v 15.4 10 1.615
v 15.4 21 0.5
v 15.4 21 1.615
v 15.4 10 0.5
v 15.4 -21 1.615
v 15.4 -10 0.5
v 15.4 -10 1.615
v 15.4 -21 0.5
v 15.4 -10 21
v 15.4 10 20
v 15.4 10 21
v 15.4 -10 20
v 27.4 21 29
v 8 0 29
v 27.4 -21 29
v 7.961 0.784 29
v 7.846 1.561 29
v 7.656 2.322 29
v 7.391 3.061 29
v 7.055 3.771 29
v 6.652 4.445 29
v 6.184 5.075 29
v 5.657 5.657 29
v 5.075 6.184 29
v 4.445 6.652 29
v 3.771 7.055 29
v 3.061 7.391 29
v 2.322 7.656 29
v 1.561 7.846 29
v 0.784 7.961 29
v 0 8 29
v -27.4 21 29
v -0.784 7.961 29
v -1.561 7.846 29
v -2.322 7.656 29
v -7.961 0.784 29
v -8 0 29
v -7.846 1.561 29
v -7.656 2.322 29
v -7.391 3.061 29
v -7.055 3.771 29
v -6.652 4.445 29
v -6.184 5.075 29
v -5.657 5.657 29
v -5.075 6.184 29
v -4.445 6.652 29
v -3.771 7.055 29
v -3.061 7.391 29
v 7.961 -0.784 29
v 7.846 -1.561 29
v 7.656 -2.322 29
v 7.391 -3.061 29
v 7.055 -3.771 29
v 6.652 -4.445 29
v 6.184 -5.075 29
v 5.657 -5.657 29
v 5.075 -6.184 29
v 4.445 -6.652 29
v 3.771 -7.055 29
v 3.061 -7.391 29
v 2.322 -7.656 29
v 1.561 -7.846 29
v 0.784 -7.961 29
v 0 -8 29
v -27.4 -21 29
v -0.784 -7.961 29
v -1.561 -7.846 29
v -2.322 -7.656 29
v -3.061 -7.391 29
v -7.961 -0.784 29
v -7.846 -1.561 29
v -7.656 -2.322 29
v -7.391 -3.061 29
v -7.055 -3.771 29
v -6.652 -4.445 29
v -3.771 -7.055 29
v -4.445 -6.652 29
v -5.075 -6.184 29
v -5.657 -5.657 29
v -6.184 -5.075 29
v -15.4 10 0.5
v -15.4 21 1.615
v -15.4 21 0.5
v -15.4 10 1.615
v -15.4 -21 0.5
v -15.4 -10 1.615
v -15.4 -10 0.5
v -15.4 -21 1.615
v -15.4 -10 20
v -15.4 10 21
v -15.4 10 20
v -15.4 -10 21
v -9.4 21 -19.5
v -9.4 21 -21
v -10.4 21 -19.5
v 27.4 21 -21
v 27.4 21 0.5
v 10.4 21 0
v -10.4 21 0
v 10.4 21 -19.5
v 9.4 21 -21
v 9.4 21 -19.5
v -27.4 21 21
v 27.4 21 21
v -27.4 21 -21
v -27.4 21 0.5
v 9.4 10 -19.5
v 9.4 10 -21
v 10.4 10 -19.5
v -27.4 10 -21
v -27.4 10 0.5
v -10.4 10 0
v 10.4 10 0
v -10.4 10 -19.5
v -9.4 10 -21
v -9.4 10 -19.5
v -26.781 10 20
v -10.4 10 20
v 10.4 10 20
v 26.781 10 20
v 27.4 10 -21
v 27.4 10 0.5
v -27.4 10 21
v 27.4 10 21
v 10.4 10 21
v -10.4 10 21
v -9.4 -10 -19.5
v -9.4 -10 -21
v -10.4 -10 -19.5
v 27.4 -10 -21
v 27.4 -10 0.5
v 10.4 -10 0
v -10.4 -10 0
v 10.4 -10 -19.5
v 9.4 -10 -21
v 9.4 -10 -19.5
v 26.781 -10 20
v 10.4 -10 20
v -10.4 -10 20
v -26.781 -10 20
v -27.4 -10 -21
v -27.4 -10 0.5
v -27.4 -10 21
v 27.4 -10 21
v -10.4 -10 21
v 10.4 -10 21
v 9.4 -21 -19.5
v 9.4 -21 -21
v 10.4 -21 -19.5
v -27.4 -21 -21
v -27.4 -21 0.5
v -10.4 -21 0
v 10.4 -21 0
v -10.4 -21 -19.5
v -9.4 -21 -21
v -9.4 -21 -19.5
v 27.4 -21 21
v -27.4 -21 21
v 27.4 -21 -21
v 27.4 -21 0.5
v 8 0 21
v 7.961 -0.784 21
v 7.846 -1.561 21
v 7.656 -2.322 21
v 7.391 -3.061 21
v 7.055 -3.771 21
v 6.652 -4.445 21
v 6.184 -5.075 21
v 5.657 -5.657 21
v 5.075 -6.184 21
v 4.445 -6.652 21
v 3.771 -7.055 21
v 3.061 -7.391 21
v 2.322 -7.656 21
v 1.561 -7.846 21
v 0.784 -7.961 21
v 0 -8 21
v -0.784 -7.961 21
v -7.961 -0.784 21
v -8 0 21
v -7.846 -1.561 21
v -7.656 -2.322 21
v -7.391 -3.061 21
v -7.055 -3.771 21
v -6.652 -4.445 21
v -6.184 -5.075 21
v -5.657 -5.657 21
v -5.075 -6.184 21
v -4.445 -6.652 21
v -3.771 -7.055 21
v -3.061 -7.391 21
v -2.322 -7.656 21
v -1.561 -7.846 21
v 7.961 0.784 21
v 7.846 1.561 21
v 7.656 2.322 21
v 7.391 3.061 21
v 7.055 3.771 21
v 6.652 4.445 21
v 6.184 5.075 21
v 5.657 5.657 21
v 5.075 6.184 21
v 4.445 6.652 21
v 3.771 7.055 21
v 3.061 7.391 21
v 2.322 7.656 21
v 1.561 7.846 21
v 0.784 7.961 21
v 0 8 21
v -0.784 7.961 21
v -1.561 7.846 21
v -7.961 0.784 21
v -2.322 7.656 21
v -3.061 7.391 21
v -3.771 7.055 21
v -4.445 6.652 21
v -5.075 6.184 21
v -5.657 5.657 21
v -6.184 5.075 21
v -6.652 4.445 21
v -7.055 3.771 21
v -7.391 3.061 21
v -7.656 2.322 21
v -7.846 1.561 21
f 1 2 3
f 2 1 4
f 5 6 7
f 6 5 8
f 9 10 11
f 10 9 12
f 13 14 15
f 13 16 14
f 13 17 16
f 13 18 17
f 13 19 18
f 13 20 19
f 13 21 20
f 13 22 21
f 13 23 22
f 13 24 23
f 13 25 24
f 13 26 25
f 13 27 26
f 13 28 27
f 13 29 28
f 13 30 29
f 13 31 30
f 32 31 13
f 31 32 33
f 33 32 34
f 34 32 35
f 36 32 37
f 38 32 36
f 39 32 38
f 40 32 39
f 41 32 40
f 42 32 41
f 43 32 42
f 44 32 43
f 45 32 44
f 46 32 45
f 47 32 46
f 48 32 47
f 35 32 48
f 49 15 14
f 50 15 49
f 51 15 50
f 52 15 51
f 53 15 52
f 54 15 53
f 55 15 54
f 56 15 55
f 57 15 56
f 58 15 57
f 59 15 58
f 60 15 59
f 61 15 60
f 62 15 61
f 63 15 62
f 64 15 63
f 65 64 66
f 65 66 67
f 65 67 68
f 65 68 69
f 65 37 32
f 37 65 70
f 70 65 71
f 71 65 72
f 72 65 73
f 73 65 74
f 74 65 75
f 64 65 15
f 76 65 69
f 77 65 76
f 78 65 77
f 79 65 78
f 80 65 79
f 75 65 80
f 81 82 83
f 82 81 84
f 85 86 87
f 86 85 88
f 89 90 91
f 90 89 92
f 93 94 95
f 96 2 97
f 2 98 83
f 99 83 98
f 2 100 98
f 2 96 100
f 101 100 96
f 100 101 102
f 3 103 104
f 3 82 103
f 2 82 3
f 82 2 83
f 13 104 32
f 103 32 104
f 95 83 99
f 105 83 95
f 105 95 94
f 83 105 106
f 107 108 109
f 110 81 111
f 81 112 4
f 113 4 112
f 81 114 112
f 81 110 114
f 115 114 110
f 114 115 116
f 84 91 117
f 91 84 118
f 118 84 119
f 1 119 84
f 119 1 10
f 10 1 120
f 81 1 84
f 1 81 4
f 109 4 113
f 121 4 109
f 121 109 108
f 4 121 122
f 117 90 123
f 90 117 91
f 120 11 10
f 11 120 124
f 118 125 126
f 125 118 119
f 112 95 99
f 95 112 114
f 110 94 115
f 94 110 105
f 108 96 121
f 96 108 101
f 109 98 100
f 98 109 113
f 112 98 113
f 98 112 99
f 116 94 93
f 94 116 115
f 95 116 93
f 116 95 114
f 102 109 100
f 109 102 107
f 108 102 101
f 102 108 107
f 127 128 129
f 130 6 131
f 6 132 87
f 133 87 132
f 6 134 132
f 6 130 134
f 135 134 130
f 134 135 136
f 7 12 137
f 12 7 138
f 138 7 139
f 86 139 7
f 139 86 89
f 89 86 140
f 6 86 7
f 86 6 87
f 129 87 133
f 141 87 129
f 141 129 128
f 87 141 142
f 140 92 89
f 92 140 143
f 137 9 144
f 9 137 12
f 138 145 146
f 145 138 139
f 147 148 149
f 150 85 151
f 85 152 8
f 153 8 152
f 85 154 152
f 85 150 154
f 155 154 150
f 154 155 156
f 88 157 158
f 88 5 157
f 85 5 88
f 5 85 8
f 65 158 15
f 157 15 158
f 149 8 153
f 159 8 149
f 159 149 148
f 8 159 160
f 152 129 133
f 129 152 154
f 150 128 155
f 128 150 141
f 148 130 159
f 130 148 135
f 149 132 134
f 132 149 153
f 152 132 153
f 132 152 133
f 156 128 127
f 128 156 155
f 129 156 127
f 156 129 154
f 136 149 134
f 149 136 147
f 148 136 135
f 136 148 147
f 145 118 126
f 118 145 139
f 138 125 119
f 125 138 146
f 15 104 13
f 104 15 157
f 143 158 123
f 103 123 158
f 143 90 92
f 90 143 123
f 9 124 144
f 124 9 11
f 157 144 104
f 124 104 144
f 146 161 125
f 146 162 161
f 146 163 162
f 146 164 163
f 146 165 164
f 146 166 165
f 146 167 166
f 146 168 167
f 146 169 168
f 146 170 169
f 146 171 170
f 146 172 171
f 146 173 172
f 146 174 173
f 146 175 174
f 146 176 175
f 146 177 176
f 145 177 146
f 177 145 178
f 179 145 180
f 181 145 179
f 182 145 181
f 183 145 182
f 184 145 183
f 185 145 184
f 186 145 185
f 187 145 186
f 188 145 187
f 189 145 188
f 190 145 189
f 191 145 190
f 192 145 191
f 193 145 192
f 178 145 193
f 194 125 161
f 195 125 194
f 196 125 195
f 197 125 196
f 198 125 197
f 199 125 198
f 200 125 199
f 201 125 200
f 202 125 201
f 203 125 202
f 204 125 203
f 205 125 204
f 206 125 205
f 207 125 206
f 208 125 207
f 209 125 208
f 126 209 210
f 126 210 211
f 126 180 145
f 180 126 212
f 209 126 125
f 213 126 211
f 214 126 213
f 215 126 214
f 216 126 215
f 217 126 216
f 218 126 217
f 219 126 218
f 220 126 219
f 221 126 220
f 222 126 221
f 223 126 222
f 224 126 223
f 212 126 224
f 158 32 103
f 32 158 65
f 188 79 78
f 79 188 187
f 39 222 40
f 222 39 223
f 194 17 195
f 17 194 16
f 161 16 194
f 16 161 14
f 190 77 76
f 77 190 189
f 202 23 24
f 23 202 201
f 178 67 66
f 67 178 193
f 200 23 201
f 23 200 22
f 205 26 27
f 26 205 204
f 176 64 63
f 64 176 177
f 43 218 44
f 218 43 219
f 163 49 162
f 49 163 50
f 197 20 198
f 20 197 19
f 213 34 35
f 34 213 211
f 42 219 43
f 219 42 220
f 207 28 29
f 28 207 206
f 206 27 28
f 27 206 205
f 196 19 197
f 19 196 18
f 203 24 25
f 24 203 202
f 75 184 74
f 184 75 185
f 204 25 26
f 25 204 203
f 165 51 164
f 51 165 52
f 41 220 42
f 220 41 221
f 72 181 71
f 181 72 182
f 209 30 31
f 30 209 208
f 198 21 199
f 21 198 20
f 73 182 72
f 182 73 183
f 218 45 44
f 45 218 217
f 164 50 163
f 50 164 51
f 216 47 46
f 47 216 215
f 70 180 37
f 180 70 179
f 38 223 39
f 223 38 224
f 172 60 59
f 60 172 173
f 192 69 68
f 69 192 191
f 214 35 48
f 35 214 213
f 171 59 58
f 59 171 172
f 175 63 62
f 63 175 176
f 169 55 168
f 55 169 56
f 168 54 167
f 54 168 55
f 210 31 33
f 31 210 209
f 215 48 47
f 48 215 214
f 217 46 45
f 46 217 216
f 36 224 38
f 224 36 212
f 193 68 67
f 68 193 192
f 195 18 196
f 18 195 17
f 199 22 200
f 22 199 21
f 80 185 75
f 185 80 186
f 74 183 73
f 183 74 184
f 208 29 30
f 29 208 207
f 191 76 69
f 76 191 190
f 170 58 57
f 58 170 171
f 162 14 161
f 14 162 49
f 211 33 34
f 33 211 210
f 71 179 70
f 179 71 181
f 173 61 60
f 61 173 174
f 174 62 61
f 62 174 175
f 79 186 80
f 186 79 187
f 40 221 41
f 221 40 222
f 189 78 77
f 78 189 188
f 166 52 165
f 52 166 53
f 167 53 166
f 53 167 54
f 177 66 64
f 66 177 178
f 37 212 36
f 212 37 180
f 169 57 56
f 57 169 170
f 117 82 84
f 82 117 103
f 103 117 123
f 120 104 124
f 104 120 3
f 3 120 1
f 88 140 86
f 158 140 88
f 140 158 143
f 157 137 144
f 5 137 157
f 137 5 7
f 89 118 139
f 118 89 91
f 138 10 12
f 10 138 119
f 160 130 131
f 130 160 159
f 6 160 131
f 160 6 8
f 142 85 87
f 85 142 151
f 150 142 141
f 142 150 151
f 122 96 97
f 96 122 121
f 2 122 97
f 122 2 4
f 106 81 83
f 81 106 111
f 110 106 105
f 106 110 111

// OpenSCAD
// file: ../perpendicular-u-joint-guard-v1.3-triangular-corner-fills/candidate_triangular_corner_fills.scad
// Candidate v1.3: four triangular concave-corner fill blocks.
//
// Base: accepted v0.7 eaves12 geometry. v0.9/v1.0/v1.1/v1.2 are not
// imported. Each corner block is a real triangular prism: broad at the roof,
// tapering continuously toward z=0, and overlapping the U side wall.

use <../perpendicular-u-joint-guard-v0.7/perpendicular_double_u_guard.scad>;

$fn = 48;
PART = "candidate_iso";

// Explicit v0.7 interface values.
roof_x_outer = 27.4;       // accepted eaves12 roof: -27.4..+27.4
side_wall_x_outer = 15.4;  // existing side-wall outer edge
blue_tube_x_outer = 10.0;  // blue lower 20x20 tube half-width
plate_y_inner = 10.0;
plate_y_outer = 21.0;
plate_depth_y = plate_y_outer - plate_y_inner; // 11 mm per front/back U plate

// The top edge is 0.5 mm inside the roof volume (roof underside z=21), and
// the lower point enters the side wall by 1 mm in X.  The XZ area therefore
// has positive overlap at both ends, not edge-only contact.
triangle_top_z = 21.5;
triangle_bottom_z = 0.0;
triangle_roof_overlap_z = triangle_top_z - 21.0;
triangle_side_overlap_x = 1.0;
triangle_inner_x = side_wall_x_outer - triangle_side_overlap_x; // 14.4

// Bottom retaining-hook contract copied from v0.7 for explicit verification.
hook_height_z = 1.5;
u_bottom_z = -21.0;
hook_top_z = u_bottom_z + hook_height_z; // -19.5

assert(plate_depth_y == 11, "每个三角块的前后板深必须是 11 mm");
assert(triangle_top_z > 21 && triangle_bottom_z == 0,
       "三角块上端必须搭入屋檐、下端落到 z=0");
assert(triangle_inner_x > blue_tube_x_outer,
       "三角块下端不得进入蓝色方管 x=-10..+10 包络");
assert(triangle_side_overlap_x > 0 && triangle_roof_overlap_z > 0,
       "三角块必须与屋檐和侧墙都有正重叠");
assert(hook_height_z == 1.5 && u_bottom_z == -21 && hook_top_z == -19.5,
       "底部卡脚必须保持 z=-21..-19.5");

// A polygon in XZ is extruded only through the corresponding front/back U
// plate. The center y=-10..+10 passage remains open.
module triangular_fill_xz(points, yc) {
    translate([0, yc, 0])
        rotate([90, 0, 0])
            linear_extrude(height = plate_depth_y,
                           center = true,
                           convexity = 10)
                polygon(points = points);
}

module front_neg_x_triangle() {
    // -X roof end -> +X inward. Top wide, lower point at the side wall.
    triangular_fill_xz([
        [-roof_x_outer, 21.0],
        [-triangle_inner_x, triangle_top_z],
        [-triangle_inner_x, triangle_bottom_z]
    ], (plate_y_inner + plate_y_outer) / 2);
}

module front_pos_x_triangle() {
    // +X roof end -> -X inward. Mirrored triangle.
    triangular_fill_xz([
        [roof_x_outer, 21.0],
        [triangle_inner_x, triangle_top_z],
        [triangle_inner_x, triangle_bottom_z]
    ], (plate_y_inner + plate_y_outer) / 2);
}

module back_neg_x_triangle() {
    triangular_fill_xz([
        [-roof_x_outer, 21.0],
        [-triangle_inner_x, triangle_top_z],
        [-triangle_inner_x, triangle_bottom_z]
    ], -(plate_y_inner + plate_y_outer) / 2);
}

module back_pos_x_triangle() {
    triangular_fill_xz([
        [roof_x_outer, 21.0],
        [triangle_inner_x, triangle_top_z],
        [triangle_inner_x, triangle_bottom_z]
    ], -(plate_y_inner + plate_y_outer) / 2);
}

module front_two_triangular_fills() {
    union() {
        front_neg_x_triangle();
        front_pos_x_triangle();
    }
}

module back_two_triangular_fills() {
    union() {
        back_neg_x_triangle();
        back_pos_x_triangle();
    }
}

module all_four_triangular_fills() {
    union() {
        front_two_triangular_fills();
        back_two_triangular_fills();
    }
}

module candidate_print_solid() {
    // Final hole operation is deliberately after the complete four-block
    // union; this preserves a true Z through-hole and the round nut pocket.
    difference() {
        union() {
            double_u_clip();
            all_four_triangular_fills();
        }
        vertical_screw_relief();
    }
}

module candidate_clip() {
    candidate_print_solid();
}

module candidate_assembly_iso() {
    upper_long_tube();
    lower_cross_tube();
    color([0.96, 0.39, 0.08]) double_u_clip();
    color([0.86, 0.13, 0.08]) front_two_triangular_fills();
    color([0.62, 0.12, 0.52]) back_two_triangular_fills();
    vertical_joint_screw();
}

module candidate_front_xz() {
    lower_cross_tube();
    color([0.96, 0.39, 0.08]) double_u_clip();
    color([0.86, 0.13, 0.08]) front_two_triangular_fills();
    vertical_joint_screw();
}

module candidate_back_xz() {
    lower_cross_tube();
    color([0.96, 0.39, 0.08]) double_u_clip();
    color([0.62, 0.12, 0.52]) back_two_triangular_fills();
    vertical_joint_screw();
}

module candidate_top_slice() {
    // At z=-0.5..2.5 the four blocks show their two front/back 11 mm bands;
    // the blue tube and the central y gap remain visible.
    slice_box = 200;
    color([0.28, 0.45, 0.78])
        intersection() {
            lower_cross_tube();
            translate([-slice_box / 2, -slice_box / 2, -0.5])
                cube([slice_box, slice_box, 3.0]);
        }
    color([0.96, 0.39, 0.08])
        intersection() {
            double_u_clip();
            translate([-slice_box / 2, -slice_box / 2, -0.5])
                cube([slice_box, slice_box, 3.0]);
        }
    color([0.86, 0.13, 0.08])
        intersection() {
            front_two_triangular_fills();
            translate([-slice_box / 2, -slice_box / 2, -0.5])
                cube([slice_box, slice_box, 3.0]);
        }
    color([0.62, 0.12, 0.52])
        intersection() {
            back_two_triangular_fills();
            translate([-slice_box / 2, -slice_box / 2, -0.5])
                cube([slice_box, slice_box, 3.0]);
        }
}

module candidate_hole_section() {
    // Center y=0 section: the bore and round nut pocket are shown without
    // confusing them with the bottom hook, which is outside this section.
    intersection() {
        candidate_print_solid();
        translate([-100, -0.4, -100]) cube([200, 0.8, 200]);
    }
}

module candidate_hook_check() {
    // Isolated lower detail: exact imported v0.7 U plate and blue tube, with
    // hook volumes highlighted only for review. This is not the print union.
    detail_box = 200;
    detail_z0 = -22;
    detail_h = 5;
    detail_y0 = 8;
    detail_ydepth = 15;
    intersection() {
        lower_cross_tube();
        translate([-detail_box / 2, detail_y0, detail_z0])
            cube([detail_box, detail_ydepth, detail_h]);
    }
    color([0.96, 0.39, 0.08])
        intersection() {
            u_plate(plate_y_inner, plate_y_outer);
            translate([-detail_box / 2, detail_y0, detail_z0])
                cube([detail_box, detail_ydepth, detail_h]);
        }
    color([0.20, 0.78, 0.20])
        intersection() {
            union() {
                translate([-13.65, 15.5, -20.25])
                    cube([3.5, 11, 1.5], center = true);
                translate([13.65, 15.5, -20.25])
                    cube([3.5, 11, 1.5], center = true);
            }
            translate([-detail_box / 2, detail_y0, detail_z0])
                cube([detail_box, detail_ydepth, detail_h]);
        }
}

if (PART == "candidate_clip") {
    candidate_clip();
} else if (PART == "candidate_front_xz") {
    candidate_front_xz();
} else if (PART == "candidate_back_xz") {
    candidate_back_xz();
} else if (PART == "candidate_top_slice") {
    candidate_top_slice();
} else if (PART == "candidate_hole_section") {
    candidate_hole_section();
} else if (PART == "candidate_hook_check") {
    candidate_hook_check();
} else {
    candidate_assembly_iso();
}
// file: ../perpendicular-u-joint-guard-v1.4-full-nut-passage/full_nut_passage_guard.scad
// v1.4: keep the exact v1.3 body; remove the nut-pocket floor with one
// full-depth Ø16 cylindrical subtraction. Units: mm; Z positive upwards.
// Imported v1.3 geometry contains all four triangles and the lower hooks.
use <../perpendicular-u-joint-guard-v1.3-triangular-corner-fills/candidate_triangular_corner_fills.scad>;

$fn = 48;
PART = "clip";
nut_passage_d = 16.0;

module full_depth_nut_passage() {
    // Cutter extends z=-31..39, past the whole printed z=-21..29 envelope.
    // 64 facets match the existing Ø16 pocket, avoiding a stepped profile.
    translate([0, 0, 4])
        cylinder(d = nut_passage_d, h = 70, center = true, $fn = 64);
}

module guard_v1_4() {
    difference() {
        candidate_print_solid();
        full_depth_nut_passage();
    }
}

guard_v1_4();
// file: ../perpendicular-u-joint-guard-v1.5-vertical-tube-clearance/vertical_tube_clearance_guard.scad
// v1.5: v1.4 Ø16 full nut passage + minimum downward-entry upper-tube slot.
// Units mm. X: upper long tube; Y: blue foot/front-back; Z: up.
use <../perpendicular-u-joint-guard-v1.4-full-nut-passage/full_nut_passage_guard.scad>;

$fn = 48;

module upper_pipe_vertical_entry_slot() {
    // Fixed gray upper tube: x=-60..60, y=-10..10, z=0..20.
    // While the clip moves down, that tube sweeps upward in clip coordinates.
    // A bottom-open slot ending at z=20 covers its whole relevant sweep in
    // the printed z=-21..29 envelope. Roof underside remains at z=21.
    // Preserve exact 20 mm Y width rather than silently adding fit clearance.
    translate([-60, -10, -31]) cube([120, 20, 51]);
}

module guard_v1_5() {
    difference() {
        guard_v1_4();
        upper_pipe_vertical_entry_slot();
    }
}

guard_v1_5();
// main file
// v1.6 X-extension candidate, mm. Keep v1.5 geometry; add lower outer blocks.
// X ends ±15.4 -> ±27.4, 12 mm per side. Y stays [-21,-10] / [10,21].
// Existing lower tube z=-20..0; original snap hook z=-21..-19.5.
// Their union spans 21 mm due to 0.5 mm intentional overlap. To honor the
// spoken 21.5 mm added-block height without moving existing features, anchor
// at the original printed bottom -21 and end the new blocks at z=+0.5.
use <../perpendicular-u-joint-guard-v1.5-vertical-tube-clearance/vertical_tube_clearance_guard.scad>;
use <../perpendicular-u-joint-guard-v1.4-full-nut-passage/full_nut_passage_guard.scad>;

$fn = 48;
x_outward_extension = 12;
original_outer_x = 15.4;
extension_bottom_z = -21;
extension_height_z = 21.5;
extension_top_z = extension_bottom_z + extension_height_z; // +0.5
extension_overlap_x = 0.1;

module lower_x_extensions() {
    // Four outer blocks join the existing four lower U arms with positive
    // 0.1 mm X overlap. No translations/scales of any original feature.
    for (y0 = [-21,10]) {
        translate([original_outer_x-extension_overlap_x, y0, extension_bottom_z])
            cube([x_outward_extension+extension_overlap_x, 11, extension_height_z]);
        translate([-original_outer_x-x_outward_extension, y0, extension_bottom_z])
            cube([x_outward_extension+extension_overlap_x, 11, extension_height_z]);
    }
}

module guard_v1_6_x() {
    difference() {
        union() { guard_v1_5(); lower_x_extensions(); }
        full_depth_nut_passage();
        upper_pipe_vertical_entry_slot();
    }
}

guard_v1_6_x();
